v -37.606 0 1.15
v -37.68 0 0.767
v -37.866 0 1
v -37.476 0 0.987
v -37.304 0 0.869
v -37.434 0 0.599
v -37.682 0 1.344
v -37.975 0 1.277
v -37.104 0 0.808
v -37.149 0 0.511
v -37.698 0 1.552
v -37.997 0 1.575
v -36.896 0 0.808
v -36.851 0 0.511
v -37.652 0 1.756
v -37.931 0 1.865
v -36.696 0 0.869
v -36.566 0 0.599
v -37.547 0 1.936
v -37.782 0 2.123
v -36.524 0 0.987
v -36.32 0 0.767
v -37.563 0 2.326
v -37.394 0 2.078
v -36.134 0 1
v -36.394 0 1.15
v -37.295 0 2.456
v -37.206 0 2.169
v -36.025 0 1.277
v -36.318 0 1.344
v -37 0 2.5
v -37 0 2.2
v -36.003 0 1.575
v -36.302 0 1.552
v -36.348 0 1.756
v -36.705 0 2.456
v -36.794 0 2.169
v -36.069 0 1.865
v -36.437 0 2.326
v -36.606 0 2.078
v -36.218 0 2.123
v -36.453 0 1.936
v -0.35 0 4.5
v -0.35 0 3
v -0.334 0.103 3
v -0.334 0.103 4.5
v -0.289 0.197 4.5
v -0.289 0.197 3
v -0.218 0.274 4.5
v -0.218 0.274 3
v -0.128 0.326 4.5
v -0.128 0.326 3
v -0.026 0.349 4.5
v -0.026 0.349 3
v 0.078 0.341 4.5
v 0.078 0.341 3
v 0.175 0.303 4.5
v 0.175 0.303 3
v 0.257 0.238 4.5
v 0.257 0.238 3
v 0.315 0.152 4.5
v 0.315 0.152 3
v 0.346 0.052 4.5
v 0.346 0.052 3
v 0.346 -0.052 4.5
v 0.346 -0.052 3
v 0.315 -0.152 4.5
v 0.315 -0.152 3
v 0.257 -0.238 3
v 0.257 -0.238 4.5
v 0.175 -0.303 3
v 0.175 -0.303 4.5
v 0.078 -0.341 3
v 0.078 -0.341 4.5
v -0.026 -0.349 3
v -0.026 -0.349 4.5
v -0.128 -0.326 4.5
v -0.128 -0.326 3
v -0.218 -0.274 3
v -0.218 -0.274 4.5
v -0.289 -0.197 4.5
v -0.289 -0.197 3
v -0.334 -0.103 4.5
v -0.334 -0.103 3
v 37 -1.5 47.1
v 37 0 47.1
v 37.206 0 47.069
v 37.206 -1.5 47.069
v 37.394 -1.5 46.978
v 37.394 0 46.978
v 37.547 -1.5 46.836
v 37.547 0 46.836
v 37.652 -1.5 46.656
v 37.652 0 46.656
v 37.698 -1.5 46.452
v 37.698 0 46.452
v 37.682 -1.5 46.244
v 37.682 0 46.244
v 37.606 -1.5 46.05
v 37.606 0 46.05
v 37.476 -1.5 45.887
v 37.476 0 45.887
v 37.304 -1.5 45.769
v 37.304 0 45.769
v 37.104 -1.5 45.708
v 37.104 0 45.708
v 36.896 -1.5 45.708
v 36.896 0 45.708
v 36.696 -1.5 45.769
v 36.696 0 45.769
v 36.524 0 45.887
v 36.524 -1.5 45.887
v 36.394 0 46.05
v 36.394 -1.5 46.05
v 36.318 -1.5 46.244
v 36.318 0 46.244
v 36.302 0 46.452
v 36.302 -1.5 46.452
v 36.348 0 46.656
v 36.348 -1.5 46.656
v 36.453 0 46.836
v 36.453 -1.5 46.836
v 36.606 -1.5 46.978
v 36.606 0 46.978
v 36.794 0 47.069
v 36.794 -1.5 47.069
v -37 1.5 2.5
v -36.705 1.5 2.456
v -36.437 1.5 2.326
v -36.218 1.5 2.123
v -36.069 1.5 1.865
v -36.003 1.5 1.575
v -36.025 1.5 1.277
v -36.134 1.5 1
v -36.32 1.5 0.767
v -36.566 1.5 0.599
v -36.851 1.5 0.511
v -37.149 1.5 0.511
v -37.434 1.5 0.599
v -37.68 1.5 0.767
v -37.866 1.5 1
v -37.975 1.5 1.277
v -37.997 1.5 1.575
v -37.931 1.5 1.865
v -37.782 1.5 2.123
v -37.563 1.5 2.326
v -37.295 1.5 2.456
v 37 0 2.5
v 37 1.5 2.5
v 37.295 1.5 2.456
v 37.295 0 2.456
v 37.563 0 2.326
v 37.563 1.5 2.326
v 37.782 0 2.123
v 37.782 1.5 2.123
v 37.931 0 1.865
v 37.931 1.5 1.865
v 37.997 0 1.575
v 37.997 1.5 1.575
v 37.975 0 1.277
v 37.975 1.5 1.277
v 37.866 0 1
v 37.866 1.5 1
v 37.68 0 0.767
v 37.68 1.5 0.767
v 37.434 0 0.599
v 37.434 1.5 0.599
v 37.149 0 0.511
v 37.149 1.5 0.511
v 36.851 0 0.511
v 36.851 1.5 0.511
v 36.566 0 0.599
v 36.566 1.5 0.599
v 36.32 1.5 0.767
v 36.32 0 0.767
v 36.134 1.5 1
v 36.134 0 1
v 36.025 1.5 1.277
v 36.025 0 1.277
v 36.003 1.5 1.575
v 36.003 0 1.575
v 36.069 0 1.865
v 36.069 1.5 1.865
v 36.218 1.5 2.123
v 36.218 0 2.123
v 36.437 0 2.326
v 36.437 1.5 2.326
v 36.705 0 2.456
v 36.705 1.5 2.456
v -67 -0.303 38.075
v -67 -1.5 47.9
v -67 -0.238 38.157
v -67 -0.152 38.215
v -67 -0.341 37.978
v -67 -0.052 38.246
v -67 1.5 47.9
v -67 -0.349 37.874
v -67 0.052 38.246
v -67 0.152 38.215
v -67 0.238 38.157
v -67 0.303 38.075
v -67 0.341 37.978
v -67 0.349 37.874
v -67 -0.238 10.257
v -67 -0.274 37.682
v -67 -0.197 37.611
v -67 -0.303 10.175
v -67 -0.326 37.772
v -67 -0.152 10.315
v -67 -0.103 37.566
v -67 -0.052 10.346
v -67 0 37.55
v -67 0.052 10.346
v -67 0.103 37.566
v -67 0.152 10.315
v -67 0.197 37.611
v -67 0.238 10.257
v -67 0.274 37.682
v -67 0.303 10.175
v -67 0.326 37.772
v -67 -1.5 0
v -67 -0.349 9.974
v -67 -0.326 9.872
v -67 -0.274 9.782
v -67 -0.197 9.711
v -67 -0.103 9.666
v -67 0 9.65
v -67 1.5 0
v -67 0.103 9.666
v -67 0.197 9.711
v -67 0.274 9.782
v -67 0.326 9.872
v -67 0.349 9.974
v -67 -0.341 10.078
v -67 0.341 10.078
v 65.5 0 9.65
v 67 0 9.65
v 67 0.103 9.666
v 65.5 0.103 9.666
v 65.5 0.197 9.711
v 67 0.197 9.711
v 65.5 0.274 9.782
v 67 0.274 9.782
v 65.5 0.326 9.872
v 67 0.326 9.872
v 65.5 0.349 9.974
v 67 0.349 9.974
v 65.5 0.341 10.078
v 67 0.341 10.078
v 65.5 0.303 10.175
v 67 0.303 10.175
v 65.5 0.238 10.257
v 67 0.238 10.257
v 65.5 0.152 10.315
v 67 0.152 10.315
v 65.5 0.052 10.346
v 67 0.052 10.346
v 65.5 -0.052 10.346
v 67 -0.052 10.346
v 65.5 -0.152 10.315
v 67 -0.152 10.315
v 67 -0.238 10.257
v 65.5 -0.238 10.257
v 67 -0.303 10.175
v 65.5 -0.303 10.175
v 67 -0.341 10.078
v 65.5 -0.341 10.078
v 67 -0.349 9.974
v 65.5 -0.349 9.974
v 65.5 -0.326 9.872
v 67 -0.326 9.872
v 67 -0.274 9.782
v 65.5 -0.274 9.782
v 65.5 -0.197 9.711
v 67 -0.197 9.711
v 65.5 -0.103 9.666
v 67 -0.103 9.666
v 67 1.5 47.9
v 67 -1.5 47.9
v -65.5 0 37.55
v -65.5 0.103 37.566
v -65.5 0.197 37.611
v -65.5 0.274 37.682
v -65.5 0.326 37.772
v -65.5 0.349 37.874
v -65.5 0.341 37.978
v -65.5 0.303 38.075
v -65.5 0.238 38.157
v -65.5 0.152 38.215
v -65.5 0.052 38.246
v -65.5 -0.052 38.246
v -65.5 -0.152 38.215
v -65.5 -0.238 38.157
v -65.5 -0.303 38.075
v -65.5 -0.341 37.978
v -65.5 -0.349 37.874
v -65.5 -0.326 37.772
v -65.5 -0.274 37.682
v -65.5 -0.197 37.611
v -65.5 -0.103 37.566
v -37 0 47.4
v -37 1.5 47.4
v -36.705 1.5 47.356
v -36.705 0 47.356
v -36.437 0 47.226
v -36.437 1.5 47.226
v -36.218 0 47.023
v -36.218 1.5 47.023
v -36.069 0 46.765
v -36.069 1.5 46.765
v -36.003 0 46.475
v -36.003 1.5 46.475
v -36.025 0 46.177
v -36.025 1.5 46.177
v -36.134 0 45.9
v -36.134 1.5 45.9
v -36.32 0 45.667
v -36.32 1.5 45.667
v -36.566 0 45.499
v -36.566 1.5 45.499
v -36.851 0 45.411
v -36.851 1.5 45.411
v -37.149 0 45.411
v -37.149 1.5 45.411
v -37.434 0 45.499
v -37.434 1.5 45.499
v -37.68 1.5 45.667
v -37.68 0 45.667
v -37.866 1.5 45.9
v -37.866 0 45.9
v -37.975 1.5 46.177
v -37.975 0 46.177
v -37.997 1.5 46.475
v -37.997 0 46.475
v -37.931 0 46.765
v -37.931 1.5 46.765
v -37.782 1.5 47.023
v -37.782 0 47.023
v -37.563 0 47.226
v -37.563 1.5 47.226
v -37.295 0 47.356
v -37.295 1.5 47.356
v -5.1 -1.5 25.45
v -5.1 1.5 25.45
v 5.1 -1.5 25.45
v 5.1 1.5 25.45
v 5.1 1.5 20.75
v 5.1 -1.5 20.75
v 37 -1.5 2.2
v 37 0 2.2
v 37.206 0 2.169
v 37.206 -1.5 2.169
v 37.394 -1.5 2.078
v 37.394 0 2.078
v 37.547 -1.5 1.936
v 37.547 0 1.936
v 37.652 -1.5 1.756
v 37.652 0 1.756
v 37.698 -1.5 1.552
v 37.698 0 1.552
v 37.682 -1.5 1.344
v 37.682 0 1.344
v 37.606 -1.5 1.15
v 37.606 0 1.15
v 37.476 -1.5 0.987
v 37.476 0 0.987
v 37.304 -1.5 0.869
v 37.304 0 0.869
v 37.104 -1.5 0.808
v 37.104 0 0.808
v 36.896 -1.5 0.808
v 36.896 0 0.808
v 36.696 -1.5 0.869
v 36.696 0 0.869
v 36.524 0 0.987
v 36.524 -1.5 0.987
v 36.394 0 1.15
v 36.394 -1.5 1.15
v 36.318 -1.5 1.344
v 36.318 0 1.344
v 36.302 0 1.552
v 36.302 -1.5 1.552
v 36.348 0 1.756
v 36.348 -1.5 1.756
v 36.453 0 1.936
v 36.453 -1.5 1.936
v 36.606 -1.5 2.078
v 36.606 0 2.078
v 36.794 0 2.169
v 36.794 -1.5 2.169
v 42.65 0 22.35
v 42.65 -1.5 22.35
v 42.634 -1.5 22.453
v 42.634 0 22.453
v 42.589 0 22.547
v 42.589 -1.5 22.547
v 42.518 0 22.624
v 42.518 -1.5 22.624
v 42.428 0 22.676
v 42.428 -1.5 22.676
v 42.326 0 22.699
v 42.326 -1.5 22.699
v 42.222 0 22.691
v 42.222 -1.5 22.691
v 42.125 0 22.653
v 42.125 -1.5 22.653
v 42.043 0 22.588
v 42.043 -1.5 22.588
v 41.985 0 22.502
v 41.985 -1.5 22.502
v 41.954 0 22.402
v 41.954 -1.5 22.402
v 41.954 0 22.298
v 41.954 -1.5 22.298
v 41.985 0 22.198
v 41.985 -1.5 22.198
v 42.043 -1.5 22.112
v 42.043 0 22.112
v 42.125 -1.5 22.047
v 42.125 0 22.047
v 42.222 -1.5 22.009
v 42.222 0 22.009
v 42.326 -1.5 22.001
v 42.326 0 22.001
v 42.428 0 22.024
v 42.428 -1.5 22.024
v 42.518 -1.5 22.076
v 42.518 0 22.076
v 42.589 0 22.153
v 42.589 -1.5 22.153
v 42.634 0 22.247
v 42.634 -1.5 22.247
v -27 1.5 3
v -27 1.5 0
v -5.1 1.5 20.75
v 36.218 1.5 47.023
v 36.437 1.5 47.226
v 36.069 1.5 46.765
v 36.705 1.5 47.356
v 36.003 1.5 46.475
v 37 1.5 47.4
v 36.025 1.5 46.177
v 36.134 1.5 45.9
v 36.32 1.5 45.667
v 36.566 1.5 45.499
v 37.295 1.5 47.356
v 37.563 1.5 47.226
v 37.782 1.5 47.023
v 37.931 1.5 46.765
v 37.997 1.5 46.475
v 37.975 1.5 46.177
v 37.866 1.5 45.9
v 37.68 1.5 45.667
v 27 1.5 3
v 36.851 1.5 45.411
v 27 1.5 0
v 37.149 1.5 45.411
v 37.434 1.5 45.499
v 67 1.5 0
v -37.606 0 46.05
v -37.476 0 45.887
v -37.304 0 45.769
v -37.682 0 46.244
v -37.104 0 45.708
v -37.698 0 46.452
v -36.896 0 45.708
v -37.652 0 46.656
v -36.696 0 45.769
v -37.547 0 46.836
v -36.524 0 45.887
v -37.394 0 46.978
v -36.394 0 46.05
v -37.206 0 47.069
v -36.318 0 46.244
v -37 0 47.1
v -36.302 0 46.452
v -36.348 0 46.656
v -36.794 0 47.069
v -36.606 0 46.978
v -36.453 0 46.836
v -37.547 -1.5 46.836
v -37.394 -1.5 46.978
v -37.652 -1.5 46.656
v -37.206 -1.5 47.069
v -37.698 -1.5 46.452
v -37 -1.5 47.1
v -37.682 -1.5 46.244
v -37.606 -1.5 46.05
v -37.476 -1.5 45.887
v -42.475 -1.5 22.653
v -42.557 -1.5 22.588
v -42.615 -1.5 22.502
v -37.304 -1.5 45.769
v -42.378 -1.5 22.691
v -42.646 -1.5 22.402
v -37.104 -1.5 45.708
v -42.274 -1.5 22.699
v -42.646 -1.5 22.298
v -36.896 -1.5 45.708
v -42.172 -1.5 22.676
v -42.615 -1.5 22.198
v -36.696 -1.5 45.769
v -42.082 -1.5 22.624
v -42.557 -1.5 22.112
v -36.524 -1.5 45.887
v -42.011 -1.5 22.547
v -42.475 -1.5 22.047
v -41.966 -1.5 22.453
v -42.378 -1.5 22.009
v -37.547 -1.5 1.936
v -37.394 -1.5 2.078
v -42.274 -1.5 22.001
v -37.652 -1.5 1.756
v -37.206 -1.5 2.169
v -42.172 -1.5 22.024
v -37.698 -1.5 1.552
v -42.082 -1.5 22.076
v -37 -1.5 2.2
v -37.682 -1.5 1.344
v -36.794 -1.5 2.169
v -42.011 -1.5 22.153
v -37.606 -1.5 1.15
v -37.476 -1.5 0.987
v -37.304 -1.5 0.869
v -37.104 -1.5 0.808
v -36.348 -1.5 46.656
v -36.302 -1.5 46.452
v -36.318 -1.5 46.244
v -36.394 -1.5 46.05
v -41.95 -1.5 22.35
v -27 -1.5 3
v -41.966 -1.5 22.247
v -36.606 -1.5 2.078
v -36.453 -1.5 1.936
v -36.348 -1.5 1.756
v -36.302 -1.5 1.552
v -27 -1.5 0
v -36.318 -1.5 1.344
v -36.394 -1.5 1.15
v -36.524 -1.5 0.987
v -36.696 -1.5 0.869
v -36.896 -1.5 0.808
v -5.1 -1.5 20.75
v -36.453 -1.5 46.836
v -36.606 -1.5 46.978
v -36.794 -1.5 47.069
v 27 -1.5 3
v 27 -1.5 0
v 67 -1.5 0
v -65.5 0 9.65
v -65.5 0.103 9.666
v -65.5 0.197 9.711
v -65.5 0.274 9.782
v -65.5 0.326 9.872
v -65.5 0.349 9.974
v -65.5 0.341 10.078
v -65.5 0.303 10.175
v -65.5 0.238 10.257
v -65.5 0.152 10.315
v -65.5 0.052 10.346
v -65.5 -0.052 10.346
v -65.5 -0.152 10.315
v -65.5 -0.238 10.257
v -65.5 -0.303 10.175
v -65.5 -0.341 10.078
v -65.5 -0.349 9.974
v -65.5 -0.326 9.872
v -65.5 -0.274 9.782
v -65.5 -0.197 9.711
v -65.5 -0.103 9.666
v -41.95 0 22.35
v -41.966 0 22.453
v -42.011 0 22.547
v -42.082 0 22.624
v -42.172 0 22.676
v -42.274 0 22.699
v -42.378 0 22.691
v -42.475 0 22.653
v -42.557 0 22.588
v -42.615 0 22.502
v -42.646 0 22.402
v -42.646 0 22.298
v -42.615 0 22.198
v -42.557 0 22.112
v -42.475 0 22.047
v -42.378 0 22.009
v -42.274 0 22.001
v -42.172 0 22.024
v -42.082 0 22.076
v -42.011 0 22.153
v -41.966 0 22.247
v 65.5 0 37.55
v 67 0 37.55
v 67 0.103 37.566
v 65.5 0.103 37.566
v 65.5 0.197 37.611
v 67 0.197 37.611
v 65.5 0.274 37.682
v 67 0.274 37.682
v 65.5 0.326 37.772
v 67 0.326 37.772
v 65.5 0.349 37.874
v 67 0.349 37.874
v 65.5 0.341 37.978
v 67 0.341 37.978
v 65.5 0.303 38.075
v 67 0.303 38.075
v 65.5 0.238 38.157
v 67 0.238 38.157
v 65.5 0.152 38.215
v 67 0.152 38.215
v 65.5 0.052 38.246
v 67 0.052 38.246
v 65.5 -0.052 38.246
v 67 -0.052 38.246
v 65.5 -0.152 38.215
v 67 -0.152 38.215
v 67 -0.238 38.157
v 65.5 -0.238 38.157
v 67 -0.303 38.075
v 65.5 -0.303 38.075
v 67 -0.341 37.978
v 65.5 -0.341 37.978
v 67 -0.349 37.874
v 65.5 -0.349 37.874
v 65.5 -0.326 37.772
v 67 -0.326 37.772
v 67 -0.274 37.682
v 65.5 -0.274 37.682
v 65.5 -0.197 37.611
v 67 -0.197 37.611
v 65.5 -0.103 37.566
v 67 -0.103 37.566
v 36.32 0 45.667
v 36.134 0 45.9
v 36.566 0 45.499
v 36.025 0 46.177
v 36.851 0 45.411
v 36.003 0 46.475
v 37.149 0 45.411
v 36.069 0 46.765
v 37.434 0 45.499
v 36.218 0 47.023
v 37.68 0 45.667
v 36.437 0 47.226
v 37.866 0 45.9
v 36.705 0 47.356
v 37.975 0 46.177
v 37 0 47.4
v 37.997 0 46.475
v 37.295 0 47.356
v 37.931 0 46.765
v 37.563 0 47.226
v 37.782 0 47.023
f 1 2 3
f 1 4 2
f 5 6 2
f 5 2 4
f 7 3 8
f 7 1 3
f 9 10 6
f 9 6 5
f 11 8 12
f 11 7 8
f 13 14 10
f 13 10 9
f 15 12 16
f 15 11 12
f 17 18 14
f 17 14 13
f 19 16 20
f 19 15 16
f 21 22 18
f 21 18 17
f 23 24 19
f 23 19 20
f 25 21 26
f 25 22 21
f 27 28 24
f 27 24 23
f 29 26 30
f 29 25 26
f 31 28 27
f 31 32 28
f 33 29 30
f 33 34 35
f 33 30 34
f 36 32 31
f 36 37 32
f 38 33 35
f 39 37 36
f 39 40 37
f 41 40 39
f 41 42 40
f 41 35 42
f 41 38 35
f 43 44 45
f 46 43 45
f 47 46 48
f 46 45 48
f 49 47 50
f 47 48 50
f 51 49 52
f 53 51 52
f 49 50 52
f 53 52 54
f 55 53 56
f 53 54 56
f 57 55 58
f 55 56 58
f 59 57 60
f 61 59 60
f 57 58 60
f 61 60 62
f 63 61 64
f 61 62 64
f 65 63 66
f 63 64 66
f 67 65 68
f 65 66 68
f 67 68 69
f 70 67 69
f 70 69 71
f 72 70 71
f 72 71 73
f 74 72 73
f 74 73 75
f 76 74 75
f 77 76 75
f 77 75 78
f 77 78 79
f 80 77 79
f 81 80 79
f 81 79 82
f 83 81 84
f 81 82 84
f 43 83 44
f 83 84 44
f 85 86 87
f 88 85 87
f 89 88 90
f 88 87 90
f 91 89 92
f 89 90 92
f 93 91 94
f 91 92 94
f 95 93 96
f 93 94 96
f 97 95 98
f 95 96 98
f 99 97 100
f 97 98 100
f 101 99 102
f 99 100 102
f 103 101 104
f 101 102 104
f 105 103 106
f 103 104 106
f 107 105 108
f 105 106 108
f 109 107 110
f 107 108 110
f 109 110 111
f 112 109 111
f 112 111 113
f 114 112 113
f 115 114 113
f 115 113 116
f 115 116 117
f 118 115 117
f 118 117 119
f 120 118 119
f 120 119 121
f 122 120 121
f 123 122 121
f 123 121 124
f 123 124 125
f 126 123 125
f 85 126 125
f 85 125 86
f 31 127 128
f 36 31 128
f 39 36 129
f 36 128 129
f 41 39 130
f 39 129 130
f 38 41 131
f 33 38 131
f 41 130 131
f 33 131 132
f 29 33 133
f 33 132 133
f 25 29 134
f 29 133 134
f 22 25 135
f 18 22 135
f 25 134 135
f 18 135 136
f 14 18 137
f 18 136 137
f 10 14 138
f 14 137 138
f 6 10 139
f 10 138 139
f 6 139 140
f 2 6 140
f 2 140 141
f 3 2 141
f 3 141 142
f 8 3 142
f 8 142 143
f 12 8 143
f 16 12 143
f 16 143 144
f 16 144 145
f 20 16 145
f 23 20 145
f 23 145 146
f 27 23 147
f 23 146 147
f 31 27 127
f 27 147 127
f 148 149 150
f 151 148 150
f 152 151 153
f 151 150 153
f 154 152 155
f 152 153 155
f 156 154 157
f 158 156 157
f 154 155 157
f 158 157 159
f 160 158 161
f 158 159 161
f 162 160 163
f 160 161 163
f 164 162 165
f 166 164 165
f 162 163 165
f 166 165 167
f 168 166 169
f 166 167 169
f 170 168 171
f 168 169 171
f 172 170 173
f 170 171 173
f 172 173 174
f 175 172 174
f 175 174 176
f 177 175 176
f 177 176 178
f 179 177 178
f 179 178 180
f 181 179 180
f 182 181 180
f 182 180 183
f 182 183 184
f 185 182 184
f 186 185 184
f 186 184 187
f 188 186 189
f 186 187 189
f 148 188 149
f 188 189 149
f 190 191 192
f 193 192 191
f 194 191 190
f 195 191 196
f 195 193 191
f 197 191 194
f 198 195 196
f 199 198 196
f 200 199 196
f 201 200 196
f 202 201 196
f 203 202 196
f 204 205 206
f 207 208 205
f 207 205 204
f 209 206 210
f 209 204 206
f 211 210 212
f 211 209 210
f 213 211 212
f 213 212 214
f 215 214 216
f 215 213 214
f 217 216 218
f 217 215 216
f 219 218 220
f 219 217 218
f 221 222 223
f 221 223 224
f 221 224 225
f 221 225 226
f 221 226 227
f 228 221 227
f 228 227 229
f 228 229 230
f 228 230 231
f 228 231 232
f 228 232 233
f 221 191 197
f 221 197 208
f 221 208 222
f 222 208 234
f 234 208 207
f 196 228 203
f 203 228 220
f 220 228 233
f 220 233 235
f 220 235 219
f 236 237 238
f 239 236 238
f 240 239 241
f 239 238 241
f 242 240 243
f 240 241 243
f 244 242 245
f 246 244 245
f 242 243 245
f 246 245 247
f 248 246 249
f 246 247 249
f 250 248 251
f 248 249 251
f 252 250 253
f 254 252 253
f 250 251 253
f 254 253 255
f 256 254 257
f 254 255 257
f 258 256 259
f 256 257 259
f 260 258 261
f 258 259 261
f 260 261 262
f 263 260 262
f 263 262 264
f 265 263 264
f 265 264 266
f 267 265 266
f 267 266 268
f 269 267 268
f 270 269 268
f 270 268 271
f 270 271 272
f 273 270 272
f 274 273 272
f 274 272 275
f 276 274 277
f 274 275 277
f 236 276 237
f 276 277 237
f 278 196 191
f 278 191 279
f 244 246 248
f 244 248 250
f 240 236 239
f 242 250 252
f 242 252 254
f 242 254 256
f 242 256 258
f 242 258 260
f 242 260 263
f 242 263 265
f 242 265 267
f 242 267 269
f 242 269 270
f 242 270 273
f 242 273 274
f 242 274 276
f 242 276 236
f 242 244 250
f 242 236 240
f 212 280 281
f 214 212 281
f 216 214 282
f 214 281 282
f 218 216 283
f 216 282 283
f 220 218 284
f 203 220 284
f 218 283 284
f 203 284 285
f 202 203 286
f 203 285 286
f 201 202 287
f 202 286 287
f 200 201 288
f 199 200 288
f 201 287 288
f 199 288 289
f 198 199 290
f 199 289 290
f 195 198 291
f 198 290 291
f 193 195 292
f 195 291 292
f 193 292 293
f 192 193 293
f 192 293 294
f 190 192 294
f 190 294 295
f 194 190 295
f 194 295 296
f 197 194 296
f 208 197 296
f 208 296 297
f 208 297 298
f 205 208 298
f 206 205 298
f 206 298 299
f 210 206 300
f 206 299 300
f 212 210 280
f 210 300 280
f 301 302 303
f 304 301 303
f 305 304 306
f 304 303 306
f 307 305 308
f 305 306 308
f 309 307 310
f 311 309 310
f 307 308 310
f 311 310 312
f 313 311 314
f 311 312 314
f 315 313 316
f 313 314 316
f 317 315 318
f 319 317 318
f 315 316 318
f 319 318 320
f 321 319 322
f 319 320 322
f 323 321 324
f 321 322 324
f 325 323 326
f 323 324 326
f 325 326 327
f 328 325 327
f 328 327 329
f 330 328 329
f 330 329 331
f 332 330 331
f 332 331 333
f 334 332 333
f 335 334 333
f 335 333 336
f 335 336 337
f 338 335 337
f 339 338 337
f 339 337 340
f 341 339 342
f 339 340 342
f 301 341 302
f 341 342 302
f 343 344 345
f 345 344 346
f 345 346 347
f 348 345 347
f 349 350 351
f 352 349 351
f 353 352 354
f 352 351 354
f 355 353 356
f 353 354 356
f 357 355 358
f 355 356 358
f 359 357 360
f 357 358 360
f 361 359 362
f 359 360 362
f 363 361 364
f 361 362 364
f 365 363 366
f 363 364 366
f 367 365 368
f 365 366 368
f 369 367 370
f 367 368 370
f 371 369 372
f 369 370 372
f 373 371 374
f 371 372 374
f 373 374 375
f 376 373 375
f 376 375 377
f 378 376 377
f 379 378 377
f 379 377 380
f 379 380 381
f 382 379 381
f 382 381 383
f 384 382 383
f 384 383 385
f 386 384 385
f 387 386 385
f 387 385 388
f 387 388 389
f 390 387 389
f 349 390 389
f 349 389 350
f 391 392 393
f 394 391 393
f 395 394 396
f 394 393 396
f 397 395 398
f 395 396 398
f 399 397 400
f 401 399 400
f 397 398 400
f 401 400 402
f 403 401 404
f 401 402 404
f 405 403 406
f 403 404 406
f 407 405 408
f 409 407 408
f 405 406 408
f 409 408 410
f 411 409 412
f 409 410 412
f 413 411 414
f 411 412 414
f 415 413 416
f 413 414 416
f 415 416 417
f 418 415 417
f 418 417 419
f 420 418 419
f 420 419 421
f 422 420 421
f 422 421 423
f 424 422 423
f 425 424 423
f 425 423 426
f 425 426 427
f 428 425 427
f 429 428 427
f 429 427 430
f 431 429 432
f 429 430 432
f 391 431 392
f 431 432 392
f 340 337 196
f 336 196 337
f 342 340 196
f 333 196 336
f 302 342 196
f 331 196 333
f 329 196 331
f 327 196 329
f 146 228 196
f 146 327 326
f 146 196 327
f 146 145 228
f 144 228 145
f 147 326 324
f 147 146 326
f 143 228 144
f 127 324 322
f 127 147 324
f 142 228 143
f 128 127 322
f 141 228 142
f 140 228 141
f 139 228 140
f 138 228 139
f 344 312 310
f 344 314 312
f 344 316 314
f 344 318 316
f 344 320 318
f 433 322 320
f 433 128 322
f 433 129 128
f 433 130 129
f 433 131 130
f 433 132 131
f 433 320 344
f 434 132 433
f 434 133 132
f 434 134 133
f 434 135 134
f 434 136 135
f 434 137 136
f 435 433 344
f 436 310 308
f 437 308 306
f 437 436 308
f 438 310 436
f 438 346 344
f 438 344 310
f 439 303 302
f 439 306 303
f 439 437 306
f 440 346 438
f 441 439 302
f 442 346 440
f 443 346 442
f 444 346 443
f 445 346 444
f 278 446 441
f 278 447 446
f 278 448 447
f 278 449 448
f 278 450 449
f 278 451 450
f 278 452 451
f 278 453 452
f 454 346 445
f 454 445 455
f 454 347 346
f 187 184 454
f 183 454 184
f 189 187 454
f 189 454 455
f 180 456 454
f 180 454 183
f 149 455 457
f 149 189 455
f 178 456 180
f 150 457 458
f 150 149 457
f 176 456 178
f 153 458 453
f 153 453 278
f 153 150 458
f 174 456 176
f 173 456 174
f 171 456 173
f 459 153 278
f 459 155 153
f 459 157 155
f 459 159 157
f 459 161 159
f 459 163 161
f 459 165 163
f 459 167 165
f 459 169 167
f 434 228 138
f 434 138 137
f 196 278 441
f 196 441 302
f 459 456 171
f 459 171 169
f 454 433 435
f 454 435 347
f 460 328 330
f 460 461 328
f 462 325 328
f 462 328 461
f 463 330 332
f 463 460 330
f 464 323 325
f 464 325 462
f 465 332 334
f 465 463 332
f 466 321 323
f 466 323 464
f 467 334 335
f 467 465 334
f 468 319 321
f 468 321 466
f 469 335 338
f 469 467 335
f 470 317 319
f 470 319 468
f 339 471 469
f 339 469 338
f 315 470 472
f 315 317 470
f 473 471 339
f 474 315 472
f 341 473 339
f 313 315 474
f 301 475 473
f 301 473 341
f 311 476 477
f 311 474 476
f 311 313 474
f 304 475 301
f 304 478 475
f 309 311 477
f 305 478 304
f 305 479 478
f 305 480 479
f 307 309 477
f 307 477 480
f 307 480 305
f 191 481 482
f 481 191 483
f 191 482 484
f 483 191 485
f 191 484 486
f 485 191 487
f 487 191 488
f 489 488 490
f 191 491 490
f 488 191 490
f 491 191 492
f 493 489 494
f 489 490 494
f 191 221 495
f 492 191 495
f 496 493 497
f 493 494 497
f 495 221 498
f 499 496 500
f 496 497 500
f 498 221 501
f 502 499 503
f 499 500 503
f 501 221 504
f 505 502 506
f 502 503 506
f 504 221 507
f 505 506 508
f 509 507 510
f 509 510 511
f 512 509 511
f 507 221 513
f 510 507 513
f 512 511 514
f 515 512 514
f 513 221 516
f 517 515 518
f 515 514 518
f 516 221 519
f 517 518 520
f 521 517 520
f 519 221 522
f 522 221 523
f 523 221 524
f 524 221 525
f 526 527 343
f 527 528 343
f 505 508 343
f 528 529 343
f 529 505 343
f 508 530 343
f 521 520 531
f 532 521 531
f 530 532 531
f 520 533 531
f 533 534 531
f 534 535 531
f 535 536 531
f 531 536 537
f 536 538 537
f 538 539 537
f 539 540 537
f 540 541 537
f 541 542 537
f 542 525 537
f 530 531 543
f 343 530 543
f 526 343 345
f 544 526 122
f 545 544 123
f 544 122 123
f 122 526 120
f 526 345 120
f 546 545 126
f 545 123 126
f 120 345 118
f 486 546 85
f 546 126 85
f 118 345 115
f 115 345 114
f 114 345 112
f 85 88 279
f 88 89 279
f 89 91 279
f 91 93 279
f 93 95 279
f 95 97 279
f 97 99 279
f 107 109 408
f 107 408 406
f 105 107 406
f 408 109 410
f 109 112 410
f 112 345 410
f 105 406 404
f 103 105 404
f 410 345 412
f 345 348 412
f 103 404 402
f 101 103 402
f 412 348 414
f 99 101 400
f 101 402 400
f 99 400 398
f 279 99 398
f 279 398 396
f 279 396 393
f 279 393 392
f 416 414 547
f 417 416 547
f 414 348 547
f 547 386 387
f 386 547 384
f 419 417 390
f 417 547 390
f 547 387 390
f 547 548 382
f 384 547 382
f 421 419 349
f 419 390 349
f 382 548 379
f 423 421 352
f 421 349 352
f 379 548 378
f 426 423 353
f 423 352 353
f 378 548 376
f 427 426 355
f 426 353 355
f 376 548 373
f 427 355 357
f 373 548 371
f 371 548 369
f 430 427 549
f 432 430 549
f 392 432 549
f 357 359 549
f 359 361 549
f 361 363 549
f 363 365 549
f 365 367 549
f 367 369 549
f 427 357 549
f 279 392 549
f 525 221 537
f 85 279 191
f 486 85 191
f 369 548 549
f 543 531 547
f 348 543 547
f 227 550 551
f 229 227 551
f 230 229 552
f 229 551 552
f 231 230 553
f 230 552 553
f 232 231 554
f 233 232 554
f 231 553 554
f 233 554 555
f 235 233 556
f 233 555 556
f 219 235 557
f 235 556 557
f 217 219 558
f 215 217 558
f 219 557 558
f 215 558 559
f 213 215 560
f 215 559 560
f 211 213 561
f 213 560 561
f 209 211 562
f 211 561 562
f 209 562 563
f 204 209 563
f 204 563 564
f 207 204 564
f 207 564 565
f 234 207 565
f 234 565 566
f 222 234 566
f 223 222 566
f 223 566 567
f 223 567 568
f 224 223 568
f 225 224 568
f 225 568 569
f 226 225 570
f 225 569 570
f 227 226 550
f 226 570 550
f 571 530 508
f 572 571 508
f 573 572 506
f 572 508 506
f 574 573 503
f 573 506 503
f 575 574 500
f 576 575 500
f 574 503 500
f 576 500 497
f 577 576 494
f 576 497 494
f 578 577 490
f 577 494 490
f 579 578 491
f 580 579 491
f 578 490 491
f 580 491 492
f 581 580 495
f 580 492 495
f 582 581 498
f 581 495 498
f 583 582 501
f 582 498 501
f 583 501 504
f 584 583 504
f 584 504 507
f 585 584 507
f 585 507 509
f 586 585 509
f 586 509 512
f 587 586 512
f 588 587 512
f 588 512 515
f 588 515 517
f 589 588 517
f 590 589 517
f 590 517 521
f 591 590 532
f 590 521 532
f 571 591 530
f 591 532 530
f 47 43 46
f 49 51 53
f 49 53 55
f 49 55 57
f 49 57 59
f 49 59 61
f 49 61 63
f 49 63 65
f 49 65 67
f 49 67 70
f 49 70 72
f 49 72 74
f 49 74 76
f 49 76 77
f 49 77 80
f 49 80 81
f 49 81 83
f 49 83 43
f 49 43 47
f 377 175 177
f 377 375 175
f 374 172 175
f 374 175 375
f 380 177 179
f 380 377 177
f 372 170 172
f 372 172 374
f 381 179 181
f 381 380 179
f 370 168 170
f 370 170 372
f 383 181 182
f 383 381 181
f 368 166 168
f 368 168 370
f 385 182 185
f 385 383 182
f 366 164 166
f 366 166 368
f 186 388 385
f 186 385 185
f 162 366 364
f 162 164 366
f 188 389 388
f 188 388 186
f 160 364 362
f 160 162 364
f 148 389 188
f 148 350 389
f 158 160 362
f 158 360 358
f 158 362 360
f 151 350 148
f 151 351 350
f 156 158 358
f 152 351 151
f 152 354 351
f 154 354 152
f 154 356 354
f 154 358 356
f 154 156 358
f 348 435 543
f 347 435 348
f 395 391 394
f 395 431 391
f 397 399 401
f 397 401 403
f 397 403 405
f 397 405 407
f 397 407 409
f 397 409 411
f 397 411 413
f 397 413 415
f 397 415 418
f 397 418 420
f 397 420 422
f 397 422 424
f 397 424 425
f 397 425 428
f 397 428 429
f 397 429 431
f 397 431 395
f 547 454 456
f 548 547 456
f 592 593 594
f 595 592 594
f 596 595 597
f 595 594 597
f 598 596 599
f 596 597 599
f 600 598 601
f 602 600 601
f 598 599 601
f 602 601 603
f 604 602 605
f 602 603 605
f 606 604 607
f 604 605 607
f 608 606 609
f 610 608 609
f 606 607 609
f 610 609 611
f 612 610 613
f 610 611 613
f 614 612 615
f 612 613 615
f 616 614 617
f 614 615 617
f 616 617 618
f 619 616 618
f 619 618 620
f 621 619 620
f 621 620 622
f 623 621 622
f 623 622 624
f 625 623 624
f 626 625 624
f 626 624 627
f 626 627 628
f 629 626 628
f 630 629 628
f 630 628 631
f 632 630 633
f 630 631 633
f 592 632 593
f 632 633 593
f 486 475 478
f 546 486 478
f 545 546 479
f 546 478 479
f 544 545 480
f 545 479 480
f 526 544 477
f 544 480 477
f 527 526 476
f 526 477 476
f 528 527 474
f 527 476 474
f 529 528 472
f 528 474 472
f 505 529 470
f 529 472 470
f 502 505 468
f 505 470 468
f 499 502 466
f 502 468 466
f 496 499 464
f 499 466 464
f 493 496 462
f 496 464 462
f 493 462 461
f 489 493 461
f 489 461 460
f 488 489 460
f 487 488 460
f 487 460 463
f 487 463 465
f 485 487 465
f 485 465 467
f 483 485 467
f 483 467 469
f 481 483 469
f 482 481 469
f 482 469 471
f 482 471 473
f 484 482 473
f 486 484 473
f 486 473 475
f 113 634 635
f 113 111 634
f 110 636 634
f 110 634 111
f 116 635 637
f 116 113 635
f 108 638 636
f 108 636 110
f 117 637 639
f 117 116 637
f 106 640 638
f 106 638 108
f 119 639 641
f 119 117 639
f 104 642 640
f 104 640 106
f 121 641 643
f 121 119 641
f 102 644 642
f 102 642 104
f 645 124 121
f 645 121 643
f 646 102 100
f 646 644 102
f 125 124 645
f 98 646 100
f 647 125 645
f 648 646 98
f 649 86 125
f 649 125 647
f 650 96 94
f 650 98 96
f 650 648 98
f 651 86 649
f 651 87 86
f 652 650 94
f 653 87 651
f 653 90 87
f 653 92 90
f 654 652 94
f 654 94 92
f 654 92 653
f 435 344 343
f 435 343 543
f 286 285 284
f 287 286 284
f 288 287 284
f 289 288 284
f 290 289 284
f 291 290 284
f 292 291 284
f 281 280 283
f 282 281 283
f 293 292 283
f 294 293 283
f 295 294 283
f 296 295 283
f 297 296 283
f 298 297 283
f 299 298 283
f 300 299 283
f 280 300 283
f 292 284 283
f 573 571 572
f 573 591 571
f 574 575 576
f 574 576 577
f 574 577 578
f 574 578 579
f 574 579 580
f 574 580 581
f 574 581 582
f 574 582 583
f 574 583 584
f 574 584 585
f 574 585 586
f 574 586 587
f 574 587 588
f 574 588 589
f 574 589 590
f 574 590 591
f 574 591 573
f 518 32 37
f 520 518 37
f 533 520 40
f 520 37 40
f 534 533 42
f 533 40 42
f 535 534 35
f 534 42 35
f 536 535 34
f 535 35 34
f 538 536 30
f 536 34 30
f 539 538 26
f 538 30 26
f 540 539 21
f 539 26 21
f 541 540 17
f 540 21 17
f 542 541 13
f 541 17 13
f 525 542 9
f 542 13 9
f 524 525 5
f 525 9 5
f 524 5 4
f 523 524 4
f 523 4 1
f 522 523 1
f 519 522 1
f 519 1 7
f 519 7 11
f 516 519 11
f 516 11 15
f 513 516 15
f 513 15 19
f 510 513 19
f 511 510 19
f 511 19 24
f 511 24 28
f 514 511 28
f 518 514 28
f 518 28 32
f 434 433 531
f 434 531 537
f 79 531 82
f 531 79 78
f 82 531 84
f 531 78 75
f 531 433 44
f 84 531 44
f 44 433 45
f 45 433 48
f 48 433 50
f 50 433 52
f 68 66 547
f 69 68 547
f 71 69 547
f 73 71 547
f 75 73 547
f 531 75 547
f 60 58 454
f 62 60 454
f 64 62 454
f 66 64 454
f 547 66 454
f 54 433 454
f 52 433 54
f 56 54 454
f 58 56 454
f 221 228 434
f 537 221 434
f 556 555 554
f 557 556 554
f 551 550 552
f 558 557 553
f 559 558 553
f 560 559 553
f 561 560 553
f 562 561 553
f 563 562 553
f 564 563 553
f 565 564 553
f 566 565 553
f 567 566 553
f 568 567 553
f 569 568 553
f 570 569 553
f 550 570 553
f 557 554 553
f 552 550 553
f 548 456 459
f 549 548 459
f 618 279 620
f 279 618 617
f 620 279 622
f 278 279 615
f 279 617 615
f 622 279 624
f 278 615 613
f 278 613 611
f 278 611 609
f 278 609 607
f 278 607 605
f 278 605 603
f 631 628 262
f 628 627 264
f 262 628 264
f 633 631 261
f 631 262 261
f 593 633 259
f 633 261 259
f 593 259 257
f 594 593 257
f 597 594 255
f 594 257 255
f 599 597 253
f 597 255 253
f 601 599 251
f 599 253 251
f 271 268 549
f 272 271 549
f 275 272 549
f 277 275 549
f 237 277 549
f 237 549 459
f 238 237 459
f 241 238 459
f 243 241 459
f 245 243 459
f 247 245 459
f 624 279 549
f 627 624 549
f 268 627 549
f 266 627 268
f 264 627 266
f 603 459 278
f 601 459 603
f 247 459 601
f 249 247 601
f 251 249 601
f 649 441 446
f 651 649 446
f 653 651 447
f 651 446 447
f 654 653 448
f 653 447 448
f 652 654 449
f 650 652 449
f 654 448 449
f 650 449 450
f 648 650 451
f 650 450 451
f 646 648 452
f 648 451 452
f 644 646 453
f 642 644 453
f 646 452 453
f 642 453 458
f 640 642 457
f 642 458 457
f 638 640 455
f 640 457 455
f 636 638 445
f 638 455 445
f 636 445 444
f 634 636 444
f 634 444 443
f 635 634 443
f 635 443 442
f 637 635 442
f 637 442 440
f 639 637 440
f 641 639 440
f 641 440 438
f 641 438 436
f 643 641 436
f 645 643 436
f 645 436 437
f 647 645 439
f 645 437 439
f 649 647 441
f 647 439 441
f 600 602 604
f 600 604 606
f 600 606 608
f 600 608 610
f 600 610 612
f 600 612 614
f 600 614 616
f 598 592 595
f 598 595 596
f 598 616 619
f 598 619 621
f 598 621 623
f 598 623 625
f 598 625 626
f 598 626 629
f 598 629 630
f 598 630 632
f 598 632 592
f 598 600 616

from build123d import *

# Parameters (mm, degrees)
SKETCH_1_W          = 134
SKETCH_1_H          = 3
EXTRUDE_1_DEPTH     = 47.9
SKETCH_4_R          = 0.7
SKETCH_4_W          = 10.2
SKETCH_4_H          = 4.7
SKETCH_4_W_2        = 54
SKETCH_4_H_2        = 3
CUT_EXTRUDE_1_DEPTH = 83.416078528
SKETCH_4_3_R        = 1
SKETCH_4_3_R_2      = 0.7
SKETCH_4_3_W        = 10.2
SKETCH_4_3_H        = 4.7
SKETCH_4_3_W_2      = 54
SKETCH_4_3_H_2      = 3
CUT_EXTRUDE_2_DEPTH = 1.5
SKETCH_5_R          = 0.35
CUT_EXTRUDE_3_DEPTH = 1.5
SKETCH_6_R          = 0.35
CUT_EXTRUDE_4_DEPTH = 1.5
SKETCH_7_R          = 0.35
CUT_EXTRUDE_5_DEPTH = 1.5
CUT_EXTRUDE_START   = -132.5
SKETCH_7_3_R        = 0.35
CUT_EXTRUDE_6_DEPTH = 1.5


with BuildPart() as part:
    # 草图1 → 凸台-拉伸1 (new body)
    with BuildSketch(Plane.XY):
        Rectangle(SKETCH_1_W, SKETCH_1_H)
    extrude(amount=EXTRUDE_1_DEPTH)

    # 草图4 → 切除-拉伸1 (cut, through all)
    with BuildSketch(Plane(origin=(0, 1.5, 0), x_dir=(1, 0, 0), z_dir=(0, 1, 0))):
        with Locations(Location((37, -46.4, 0), (0, 0, 270))):
            Circle(SKETCH_4_R)
        with Locations(Location((-37, -46.4, 0), (0, 0, 270))):
            Circle(SKETCH_4_R)
        with Locations((0, -23.1)):
            Rectangle(SKETCH_4_W, SKETCH_4_H)
        with Locations((0, -1.5)):
            Rectangle(SKETCH_4_W_2, SKETCH_4_H_2)
        with Locations(Location((-37, -1.5, 0), (0, 0, 270))):
            Circle(SKETCH_4_R)
        with Locations(Location((37, -1.5, 0), (0, 0, 270))):
            Circle(SKETCH_4_R)
    extrude(amount=-CUT_EXTRUDE_1_DEPTH, mode=Mode.SUBTRACT)

    # 草图4<3> → 切除-拉伸2 (cut)
    # profile 1 of 6: a face of its own
    with BuildSketch(Plane(origin=(0, 1.5, 0), x_dir=(1, 0, 0), z_dir=(0, 1, 0))):
        with Locations(Location((-37, -46.4, 0), (0, 0, 270))):
            Circle(SKETCH_4_3_R)
        with Locations(Location((-37, -46.4, 0), (0, 0, 270))):
            Circle(SKETCH_4_3_R_2, mode=Mode.SUBTRACT)
    # profile 2 of 6: a face of its own
    with BuildSketch(Plane(origin=(0, 1.5, 0), x_dir=(1, 0, 0), z_dir=(0, 1, 0))):
        with Locations(Location((37, -46.4, 0), (0, 0, 270))):
            Circle(SKETCH_4_3_R)
        with Locations(Location((37, -46.4, 0), (0, 0, 270))):
            Circle(SKETCH_4_3_R_2, mode=Mode.SUBTRACT)
    # profile 3 of 6: a face of its own
    with BuildSketch(Plane(origin=(0, 1.5, 0), x_dir=(1, 0, 0), z_dir=(0, 1, 0))):
        with Locations(Location((37, -1.5, 0), (0, 0, 270))):
            Circle(SKETCH_4_3_R)
        with Locations(Location((37, -1.5, 0), (0, 0, 270))):
            Circle(SKETCH_4_3_R_2, mode=Mode.SUBTRACT)
    # profile 4 of 6: a face of its own
    with BuildSketch(Plane(origin=(0, 1.5, 0), x_dir=(1, 0, 0), z_dir=(0, 1, 0))):
        with Locations(Location((-37, -1.5, 0), (0, 0, 270))):
            Circle(SKETCH_4_3_R)
        with Locations(Location((-37, -1.5, 0), (0, 0, 270))):
            Circle(SKETCH_4_3_R_2, mode=Mode.SUBTRACT)
    # profile 5 of 6: a face of its own
    with BuildSketch(Plane(origin=(0, 1.5, 0), x_dir=(1, 0, 0), z_dir=(0, 1, 0))):
        with Locations((0, -23.1)):
            Rectangle(SKETCH_4_3_W, SKETCH_4_3_H)
    # profile 6 of 6: a face of its own
    with BuildSketch(Plane(origin=(0, 1.5, 0), x_dir=(1, 0, 0), z_dir=(0, 1, 0))):
        with Locations((0, -1.5)):
            Rectangle(SKETCH_4_3_W_2, SKETCH_4_3_H_2)
    extrude(amount=-CUT_EXTRUDE_2_DEPTH, mode=Mode.SUBTRACT)

    # 草图5 → 切除-拉伸3 (cut)
    with BuildSketch(Plane.XZ.offset(1.5)):
        with Locations((42.3, 22.35)):
            Circle(SKETCH_5_R)
        with Locations((-42.3, 22.35)):
            Circle(SKETCH_5_R)
    extrude(amount=-CUT_EXTRUDE_3_DEPTH, mode=Mode.SUBTRACT)

    # 草图6 → 切除-拉伸4 (cut)
    with BuildSketch(Plane(origin=(0, 0, 3), x_dir=(-1, 0, 0), z_dir=(0, 0, -1))):
        Circle(SKETCH_6_R)
    extrude(amount=-CUT_EXTRUDE_4_DEPTH, mode=Mode.SUBTRACT)

    # 草图7 → 切除-拉伸5 (cut)
    with BuildSketch(Plane(origin=(67, 0, 0), x_dir=(0, 0, -1), z_dir=(1, 0, 0))):
        with Locations((-10, 0)):
            Circle(SKETCH_7_R)
        with Locations((-37.9, 0)):
            Circle(SKETCH_7_R)
    extrude(amount=-CUT_EXTRUDE_5_DEPTH, mode=Mode.SUBTRACT)

    # 草图7<3> → 切除-拉伸6 (cut)
    with BuildSketch(Plane(origin=(67, 0, 0), x_dir=(0, 0, -1), z_dir=(1, 0, 0)).offset(CUT_EXTRUDE_START)):
        with Locations((-10, 0)):
            Circle(SKETCH_7_3_R)
        with Locations((-37.9, 0)):
            Circle(SKETCH_7_3_R)
    extrude(amount=-CUT_EXTRUDE_6_DEPTH, mode=Mode.SUBTRACT)


solid = part.part
